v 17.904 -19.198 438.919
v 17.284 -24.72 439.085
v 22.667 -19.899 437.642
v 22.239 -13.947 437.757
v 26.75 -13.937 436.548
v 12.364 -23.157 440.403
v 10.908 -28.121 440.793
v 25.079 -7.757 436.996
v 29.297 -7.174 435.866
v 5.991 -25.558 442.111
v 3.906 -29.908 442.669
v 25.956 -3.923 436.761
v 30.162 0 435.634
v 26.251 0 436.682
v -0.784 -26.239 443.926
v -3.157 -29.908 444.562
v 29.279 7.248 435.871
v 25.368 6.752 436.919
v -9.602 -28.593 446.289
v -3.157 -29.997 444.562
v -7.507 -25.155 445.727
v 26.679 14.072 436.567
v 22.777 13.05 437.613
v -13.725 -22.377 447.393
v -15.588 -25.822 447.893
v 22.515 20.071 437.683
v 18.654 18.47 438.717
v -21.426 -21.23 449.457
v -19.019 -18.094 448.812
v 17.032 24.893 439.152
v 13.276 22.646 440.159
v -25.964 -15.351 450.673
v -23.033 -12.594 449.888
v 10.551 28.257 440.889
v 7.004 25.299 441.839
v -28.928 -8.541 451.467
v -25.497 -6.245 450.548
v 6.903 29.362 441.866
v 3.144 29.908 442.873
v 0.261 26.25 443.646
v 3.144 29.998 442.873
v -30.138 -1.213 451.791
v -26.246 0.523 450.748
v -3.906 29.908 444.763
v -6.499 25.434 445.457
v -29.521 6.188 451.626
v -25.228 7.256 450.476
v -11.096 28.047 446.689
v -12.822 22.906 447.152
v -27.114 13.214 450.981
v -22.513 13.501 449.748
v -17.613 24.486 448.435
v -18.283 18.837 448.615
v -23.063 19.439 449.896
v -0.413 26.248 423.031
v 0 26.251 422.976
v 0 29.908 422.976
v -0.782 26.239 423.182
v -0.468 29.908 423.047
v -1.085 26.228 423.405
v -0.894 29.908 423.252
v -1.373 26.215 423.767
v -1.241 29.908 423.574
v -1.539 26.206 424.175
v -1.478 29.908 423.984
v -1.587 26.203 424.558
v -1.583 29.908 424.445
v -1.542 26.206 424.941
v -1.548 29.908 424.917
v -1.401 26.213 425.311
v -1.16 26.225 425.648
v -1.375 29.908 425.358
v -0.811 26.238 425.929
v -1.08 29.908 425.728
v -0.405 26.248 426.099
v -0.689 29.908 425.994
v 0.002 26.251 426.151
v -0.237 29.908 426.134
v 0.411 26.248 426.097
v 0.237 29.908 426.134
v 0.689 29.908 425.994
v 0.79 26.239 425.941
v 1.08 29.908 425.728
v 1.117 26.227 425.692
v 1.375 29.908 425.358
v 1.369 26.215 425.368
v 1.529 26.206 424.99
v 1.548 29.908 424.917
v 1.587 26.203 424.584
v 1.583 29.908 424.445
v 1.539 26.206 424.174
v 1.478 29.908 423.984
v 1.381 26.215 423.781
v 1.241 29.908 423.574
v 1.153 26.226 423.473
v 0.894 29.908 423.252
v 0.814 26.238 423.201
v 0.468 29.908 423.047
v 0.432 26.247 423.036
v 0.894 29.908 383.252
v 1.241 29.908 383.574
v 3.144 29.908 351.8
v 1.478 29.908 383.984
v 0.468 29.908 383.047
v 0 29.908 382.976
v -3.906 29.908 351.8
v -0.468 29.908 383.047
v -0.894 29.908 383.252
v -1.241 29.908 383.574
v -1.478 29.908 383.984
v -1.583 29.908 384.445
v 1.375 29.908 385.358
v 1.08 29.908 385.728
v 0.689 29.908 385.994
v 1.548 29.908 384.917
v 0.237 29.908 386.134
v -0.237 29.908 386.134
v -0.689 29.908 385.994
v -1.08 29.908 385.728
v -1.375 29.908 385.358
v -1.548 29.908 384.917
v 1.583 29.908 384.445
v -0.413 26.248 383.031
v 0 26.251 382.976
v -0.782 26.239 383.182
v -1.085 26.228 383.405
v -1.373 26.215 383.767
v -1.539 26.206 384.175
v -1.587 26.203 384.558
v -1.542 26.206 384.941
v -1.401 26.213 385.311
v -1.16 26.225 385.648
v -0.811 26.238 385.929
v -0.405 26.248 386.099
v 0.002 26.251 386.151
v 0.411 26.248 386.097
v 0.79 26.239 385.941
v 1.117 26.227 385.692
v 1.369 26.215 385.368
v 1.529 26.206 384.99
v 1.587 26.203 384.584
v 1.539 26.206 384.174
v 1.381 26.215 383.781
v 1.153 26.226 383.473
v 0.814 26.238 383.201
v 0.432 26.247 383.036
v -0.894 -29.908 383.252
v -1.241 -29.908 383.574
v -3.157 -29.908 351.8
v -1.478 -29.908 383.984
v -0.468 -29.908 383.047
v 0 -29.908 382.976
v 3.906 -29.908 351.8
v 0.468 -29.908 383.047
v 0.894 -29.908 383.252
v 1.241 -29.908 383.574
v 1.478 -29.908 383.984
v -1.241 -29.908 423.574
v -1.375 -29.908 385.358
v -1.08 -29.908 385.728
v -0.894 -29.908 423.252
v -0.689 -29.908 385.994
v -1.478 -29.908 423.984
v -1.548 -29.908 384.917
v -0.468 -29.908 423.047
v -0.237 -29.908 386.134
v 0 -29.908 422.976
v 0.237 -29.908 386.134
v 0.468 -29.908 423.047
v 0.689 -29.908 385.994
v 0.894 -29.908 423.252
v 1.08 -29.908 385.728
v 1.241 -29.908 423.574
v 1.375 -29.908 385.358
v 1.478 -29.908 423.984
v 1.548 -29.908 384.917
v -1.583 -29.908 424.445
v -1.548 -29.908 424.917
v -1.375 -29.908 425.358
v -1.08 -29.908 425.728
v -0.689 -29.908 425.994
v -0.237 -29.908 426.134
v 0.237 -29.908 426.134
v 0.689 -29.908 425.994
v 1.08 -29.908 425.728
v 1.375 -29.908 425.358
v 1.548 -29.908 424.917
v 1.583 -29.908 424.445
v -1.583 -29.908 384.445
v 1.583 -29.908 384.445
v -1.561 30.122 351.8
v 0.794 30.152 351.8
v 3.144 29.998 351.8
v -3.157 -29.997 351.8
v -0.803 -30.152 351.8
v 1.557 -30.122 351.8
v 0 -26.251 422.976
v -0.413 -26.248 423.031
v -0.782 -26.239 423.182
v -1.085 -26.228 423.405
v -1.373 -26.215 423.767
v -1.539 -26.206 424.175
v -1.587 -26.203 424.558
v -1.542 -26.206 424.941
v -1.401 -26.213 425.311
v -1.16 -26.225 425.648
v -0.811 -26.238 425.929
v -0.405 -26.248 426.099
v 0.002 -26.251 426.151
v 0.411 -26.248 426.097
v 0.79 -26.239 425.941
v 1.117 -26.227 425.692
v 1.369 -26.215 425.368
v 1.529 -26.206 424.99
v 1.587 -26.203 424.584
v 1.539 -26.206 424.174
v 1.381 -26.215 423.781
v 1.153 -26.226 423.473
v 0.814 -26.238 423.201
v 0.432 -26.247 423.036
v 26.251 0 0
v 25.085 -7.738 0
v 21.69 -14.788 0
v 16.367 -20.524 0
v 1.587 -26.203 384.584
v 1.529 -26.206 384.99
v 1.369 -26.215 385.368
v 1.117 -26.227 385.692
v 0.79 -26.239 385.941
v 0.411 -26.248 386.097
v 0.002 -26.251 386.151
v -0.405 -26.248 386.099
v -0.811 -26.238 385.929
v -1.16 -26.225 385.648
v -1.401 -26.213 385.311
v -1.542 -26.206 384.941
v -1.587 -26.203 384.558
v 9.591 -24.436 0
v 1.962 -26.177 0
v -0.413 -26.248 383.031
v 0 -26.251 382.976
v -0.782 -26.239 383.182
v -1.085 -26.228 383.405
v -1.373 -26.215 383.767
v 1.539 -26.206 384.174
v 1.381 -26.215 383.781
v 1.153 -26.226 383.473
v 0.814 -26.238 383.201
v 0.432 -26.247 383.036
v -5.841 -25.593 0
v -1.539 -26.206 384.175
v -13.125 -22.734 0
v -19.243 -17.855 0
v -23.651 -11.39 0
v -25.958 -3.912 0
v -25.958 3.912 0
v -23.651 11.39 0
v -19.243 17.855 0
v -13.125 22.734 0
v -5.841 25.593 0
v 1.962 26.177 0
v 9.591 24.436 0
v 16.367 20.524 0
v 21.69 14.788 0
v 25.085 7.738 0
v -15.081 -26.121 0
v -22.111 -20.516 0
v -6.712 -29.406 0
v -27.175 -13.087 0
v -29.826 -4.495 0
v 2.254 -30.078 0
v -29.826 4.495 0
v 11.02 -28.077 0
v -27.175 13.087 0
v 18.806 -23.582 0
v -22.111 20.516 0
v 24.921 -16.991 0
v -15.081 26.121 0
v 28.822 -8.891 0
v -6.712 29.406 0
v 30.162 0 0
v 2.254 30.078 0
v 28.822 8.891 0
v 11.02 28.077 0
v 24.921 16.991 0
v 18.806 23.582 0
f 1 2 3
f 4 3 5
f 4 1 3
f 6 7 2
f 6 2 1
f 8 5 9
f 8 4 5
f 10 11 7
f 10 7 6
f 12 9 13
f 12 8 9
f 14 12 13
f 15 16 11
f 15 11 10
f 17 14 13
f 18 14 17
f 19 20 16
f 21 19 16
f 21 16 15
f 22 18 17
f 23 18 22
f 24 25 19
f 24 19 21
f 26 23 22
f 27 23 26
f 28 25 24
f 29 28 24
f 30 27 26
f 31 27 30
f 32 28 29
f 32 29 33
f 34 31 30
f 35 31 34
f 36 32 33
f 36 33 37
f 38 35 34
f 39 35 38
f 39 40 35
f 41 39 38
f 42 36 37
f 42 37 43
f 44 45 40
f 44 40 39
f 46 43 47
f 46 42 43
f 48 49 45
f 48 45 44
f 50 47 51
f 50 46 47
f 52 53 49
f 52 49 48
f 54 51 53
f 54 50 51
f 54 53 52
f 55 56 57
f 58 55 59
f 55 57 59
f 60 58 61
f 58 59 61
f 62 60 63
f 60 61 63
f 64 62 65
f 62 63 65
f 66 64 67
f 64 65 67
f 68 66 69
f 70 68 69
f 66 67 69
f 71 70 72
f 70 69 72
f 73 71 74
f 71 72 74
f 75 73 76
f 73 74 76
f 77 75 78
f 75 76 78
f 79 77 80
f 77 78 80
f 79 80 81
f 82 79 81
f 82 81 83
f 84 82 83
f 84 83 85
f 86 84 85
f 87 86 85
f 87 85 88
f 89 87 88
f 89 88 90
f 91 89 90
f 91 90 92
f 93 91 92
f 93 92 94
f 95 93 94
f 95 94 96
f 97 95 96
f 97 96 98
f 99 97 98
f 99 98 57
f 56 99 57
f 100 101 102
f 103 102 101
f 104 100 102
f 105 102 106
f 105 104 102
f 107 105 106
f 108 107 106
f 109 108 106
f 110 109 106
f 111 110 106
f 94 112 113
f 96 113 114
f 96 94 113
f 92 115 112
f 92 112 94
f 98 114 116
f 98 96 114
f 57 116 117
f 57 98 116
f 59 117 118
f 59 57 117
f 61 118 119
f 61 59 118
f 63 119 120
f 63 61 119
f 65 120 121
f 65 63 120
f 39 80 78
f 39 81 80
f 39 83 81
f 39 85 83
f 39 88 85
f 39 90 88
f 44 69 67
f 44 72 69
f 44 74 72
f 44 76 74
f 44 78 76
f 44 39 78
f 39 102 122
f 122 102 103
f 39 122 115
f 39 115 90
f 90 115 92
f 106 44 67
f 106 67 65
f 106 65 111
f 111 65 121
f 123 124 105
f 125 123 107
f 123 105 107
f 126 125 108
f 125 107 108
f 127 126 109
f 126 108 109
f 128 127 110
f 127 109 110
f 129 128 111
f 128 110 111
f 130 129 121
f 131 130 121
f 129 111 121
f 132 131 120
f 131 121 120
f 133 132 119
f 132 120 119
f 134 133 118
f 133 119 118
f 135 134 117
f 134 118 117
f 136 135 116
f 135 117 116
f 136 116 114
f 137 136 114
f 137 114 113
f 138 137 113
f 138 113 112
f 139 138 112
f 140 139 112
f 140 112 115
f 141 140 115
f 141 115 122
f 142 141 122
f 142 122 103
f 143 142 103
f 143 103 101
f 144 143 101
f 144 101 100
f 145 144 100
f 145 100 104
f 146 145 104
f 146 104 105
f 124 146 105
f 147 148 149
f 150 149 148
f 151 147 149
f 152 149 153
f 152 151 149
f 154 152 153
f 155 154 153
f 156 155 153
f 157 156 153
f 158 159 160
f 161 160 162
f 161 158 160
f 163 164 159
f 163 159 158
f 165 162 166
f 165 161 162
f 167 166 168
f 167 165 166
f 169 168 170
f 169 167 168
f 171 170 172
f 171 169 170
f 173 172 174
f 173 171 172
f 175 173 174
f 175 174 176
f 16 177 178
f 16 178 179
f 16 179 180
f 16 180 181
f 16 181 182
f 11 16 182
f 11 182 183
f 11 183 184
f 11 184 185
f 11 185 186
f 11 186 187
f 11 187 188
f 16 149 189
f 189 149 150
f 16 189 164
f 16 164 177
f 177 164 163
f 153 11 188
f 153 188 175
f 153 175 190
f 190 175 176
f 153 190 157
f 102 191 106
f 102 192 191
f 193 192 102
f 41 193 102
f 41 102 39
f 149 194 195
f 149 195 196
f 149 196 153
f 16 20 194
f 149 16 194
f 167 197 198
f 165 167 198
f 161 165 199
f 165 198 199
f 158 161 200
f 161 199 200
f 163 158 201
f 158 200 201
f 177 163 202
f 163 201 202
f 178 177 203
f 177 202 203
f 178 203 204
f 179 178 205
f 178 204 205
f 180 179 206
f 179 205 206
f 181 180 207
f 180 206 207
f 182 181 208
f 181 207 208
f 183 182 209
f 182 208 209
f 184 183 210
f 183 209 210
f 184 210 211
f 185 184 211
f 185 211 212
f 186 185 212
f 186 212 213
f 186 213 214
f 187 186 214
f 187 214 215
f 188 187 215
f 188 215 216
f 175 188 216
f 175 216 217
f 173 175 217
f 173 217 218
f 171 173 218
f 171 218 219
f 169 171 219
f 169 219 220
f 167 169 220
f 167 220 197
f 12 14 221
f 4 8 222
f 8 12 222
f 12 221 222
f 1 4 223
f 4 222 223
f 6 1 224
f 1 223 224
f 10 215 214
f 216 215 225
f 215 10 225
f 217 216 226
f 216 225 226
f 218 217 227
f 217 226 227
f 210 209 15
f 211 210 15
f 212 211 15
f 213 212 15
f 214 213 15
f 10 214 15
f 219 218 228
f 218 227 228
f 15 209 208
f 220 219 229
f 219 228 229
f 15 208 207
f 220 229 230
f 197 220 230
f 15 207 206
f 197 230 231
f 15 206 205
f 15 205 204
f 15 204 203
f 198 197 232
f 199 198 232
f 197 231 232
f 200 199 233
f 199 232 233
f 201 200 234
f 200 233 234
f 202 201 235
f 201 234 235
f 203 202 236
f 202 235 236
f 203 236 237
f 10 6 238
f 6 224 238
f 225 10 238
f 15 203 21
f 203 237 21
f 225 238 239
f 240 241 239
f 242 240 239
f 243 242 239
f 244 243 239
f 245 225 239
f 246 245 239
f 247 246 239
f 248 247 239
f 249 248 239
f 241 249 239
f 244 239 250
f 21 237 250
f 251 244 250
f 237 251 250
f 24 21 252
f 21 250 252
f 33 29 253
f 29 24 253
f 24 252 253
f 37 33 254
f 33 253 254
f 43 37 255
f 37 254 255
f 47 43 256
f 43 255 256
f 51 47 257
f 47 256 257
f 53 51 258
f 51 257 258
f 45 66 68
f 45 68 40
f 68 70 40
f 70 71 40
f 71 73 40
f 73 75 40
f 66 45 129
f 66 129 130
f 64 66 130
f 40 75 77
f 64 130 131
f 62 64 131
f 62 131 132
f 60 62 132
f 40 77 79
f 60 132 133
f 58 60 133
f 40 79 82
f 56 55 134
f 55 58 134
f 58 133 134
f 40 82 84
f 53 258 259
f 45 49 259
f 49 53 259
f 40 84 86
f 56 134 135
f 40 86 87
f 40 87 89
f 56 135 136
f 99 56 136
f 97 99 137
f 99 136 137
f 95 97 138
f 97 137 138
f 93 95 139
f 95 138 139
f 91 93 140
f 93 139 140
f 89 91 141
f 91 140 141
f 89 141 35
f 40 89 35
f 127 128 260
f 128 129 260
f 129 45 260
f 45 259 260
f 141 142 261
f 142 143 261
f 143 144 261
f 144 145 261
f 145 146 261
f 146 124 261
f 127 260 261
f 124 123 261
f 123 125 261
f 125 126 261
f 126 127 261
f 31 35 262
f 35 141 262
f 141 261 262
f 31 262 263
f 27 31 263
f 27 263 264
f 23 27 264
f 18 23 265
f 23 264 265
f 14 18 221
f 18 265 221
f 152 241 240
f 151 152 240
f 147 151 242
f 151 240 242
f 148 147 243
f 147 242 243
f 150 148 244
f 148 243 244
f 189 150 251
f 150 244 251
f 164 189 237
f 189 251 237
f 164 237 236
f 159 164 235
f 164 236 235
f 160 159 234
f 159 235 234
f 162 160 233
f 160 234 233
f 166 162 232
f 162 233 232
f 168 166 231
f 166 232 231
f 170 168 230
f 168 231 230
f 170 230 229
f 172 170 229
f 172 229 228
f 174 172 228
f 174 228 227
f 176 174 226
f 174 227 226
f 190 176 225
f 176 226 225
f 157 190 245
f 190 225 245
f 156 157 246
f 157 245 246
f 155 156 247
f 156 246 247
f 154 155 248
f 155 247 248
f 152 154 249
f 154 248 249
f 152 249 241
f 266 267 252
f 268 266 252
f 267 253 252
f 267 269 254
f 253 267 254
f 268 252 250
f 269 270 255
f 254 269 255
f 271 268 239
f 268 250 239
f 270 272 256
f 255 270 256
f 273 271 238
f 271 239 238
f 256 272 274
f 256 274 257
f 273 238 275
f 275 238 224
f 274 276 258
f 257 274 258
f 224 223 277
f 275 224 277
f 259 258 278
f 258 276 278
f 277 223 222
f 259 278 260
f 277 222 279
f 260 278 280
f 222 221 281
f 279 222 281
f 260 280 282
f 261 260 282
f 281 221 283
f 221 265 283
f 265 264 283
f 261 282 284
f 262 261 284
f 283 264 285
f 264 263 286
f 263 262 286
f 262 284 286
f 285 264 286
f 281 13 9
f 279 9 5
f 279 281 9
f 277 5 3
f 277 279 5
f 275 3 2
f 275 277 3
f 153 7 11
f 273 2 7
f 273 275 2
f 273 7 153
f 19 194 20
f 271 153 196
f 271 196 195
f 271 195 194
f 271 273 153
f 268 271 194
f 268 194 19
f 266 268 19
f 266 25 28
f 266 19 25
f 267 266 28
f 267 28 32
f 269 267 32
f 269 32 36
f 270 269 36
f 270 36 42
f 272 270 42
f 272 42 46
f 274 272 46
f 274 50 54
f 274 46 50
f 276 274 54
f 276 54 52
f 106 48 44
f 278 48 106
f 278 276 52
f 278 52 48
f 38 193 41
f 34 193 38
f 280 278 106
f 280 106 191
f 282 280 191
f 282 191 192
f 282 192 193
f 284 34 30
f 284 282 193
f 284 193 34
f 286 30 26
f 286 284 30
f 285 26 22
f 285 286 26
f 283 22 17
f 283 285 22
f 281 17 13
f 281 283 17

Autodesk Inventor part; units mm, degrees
sketch "Sketch1" plane through (0, 0, 0) normal (0, 0, 1) x (1, 0, 0)
  circle A0 centre (0, 0) radius 30.1625
  circle A1 centre (0, 0) radius 26.2509
  dimension "d0" = 60.325
  dimension "d2" = 3.9116
extrude "Extrusion1" add sketch "Sketch1" along normal blind 451.8
sketch "Sketch18" plane through (0, 0, 451.8) normal (0, 0, 1) x (1, 0, 0)
  circle A0 centre (0, 0) radius 26.2509 projected
  circle A1 centre (0, 0) radius 30.1625 projected
  point P0 (-30.1625, 0)
ref_plane "Work Plane9" through (-30.1625, 0, 451.8) normal (0.2588, 0, 0.9659) x (0, 1, 0)
sketch "Sketch19" plane through (-30.1625, 0, 451.8) normal (0.2588, 0, 0.9659) x (0, 1, 0)
  line L0 (-31.6137, -94.9476) -> (64.4261, -94.9476)
  line L1 (64.4261, -94.9476) -> (64.4261, 6.6524)
  line L2 (64.4261, 6.6524) -> (-31.6137, 6.6524)
  line L3 (-31.6137, 6.6524) -> (-31.6137, -94.9476)
  point P0 (0, -146.0692)
  dimension "d61" = 101.6
extrude "Extrusion11" cut sketch "Sketch19" along normal blind 25.4
sketch "Sketch20" plane through (0, 0, 0) normal (0, 0, -1) x (-1, 0, 0)
  circle A0 centre (0, 0) radius 26.2509 projected
  circle A1 centre (0, 0) radius 30.1625 projected
  point P0 (0, 30.1625)
  point P1 (0, -30.1625)
ref_plane "Work Plane10" through (0, 30.1625, 0) normal (0, 1, 0) x (-1, 0, 0)
ref_plane "Work Plane11" through (0, -30.1625, 0) normal (0, -1, 0) x (1, 0, 0)
sketch "Sketch21" plane through (0, 30.1625, 0) normal (0, 1, 0) x (-1, 0, 0)
  line L0 (-3.1444, 451.8) -> (6.8556, 451.8)
  line L1 (6.8556, 451.8) -> (6.8556, 351.8)
  line L2 (6.8556, 351.8) -> (-3.1444, 351.8)
  line L3 (-3.1444, 351.8) -> (-3.1444, 451.8)
  line L4 (1.8556, 451.8) -> (1.8556, 351.8) construction
  point P0 (0, 0)
  dimension "d64" = 10
  dimension "d65" = 100
  dimension "d82" = 351.8
extrude "flat1" cut sketch "Sketch21" against normal blind 0.254
sketch "Sketch22" plane through (0, -30.1625, 0) normal (0, -1, 0) x (1, 0, 0)
  line L0 (-3.1568, 351.8) -> (6.8432, 351.8)
  line L1 (6.8432, 351.8) -> (6.8432, 451.8)
  line L2 (6.8432, 451.8) -> (-3.1568, 451.8)
  line L3 (-3.1568, 451.8) -> (-3.1568, 351.8)
  line L4 (1.8432, 451.8) -> (1.8432, 351.8) construction
  point P0 (0, 0)
  dimension "d68" = 10
  dimension "d69" = 100
  dimension "d83" = 351.8
extrude "flat2" cut sketch "Sketch22" against normal blind 0.254
sketch "Sketch23" plane through (0, -29.9085, 0) normal (0, -1, 0) x (1, 0, 0)
  circle A0 centre (0, 424.5638) radius 1.4603
  circle A1 centre (0, 384.5638) radius 1.4603
  point P0 (-3.1568, 444.5638)
  point P1 (0, 0)
  dimension "d73" = 40
  dimension "d74" = 20
hole "Hole1" at (0, -29.9085, 424.5638) at (0, -29.9085, 384.5638) direction (0, 1, 0) diameter 3.175 end through all
properties part number "2r2scs" material "PVC-Piping"
